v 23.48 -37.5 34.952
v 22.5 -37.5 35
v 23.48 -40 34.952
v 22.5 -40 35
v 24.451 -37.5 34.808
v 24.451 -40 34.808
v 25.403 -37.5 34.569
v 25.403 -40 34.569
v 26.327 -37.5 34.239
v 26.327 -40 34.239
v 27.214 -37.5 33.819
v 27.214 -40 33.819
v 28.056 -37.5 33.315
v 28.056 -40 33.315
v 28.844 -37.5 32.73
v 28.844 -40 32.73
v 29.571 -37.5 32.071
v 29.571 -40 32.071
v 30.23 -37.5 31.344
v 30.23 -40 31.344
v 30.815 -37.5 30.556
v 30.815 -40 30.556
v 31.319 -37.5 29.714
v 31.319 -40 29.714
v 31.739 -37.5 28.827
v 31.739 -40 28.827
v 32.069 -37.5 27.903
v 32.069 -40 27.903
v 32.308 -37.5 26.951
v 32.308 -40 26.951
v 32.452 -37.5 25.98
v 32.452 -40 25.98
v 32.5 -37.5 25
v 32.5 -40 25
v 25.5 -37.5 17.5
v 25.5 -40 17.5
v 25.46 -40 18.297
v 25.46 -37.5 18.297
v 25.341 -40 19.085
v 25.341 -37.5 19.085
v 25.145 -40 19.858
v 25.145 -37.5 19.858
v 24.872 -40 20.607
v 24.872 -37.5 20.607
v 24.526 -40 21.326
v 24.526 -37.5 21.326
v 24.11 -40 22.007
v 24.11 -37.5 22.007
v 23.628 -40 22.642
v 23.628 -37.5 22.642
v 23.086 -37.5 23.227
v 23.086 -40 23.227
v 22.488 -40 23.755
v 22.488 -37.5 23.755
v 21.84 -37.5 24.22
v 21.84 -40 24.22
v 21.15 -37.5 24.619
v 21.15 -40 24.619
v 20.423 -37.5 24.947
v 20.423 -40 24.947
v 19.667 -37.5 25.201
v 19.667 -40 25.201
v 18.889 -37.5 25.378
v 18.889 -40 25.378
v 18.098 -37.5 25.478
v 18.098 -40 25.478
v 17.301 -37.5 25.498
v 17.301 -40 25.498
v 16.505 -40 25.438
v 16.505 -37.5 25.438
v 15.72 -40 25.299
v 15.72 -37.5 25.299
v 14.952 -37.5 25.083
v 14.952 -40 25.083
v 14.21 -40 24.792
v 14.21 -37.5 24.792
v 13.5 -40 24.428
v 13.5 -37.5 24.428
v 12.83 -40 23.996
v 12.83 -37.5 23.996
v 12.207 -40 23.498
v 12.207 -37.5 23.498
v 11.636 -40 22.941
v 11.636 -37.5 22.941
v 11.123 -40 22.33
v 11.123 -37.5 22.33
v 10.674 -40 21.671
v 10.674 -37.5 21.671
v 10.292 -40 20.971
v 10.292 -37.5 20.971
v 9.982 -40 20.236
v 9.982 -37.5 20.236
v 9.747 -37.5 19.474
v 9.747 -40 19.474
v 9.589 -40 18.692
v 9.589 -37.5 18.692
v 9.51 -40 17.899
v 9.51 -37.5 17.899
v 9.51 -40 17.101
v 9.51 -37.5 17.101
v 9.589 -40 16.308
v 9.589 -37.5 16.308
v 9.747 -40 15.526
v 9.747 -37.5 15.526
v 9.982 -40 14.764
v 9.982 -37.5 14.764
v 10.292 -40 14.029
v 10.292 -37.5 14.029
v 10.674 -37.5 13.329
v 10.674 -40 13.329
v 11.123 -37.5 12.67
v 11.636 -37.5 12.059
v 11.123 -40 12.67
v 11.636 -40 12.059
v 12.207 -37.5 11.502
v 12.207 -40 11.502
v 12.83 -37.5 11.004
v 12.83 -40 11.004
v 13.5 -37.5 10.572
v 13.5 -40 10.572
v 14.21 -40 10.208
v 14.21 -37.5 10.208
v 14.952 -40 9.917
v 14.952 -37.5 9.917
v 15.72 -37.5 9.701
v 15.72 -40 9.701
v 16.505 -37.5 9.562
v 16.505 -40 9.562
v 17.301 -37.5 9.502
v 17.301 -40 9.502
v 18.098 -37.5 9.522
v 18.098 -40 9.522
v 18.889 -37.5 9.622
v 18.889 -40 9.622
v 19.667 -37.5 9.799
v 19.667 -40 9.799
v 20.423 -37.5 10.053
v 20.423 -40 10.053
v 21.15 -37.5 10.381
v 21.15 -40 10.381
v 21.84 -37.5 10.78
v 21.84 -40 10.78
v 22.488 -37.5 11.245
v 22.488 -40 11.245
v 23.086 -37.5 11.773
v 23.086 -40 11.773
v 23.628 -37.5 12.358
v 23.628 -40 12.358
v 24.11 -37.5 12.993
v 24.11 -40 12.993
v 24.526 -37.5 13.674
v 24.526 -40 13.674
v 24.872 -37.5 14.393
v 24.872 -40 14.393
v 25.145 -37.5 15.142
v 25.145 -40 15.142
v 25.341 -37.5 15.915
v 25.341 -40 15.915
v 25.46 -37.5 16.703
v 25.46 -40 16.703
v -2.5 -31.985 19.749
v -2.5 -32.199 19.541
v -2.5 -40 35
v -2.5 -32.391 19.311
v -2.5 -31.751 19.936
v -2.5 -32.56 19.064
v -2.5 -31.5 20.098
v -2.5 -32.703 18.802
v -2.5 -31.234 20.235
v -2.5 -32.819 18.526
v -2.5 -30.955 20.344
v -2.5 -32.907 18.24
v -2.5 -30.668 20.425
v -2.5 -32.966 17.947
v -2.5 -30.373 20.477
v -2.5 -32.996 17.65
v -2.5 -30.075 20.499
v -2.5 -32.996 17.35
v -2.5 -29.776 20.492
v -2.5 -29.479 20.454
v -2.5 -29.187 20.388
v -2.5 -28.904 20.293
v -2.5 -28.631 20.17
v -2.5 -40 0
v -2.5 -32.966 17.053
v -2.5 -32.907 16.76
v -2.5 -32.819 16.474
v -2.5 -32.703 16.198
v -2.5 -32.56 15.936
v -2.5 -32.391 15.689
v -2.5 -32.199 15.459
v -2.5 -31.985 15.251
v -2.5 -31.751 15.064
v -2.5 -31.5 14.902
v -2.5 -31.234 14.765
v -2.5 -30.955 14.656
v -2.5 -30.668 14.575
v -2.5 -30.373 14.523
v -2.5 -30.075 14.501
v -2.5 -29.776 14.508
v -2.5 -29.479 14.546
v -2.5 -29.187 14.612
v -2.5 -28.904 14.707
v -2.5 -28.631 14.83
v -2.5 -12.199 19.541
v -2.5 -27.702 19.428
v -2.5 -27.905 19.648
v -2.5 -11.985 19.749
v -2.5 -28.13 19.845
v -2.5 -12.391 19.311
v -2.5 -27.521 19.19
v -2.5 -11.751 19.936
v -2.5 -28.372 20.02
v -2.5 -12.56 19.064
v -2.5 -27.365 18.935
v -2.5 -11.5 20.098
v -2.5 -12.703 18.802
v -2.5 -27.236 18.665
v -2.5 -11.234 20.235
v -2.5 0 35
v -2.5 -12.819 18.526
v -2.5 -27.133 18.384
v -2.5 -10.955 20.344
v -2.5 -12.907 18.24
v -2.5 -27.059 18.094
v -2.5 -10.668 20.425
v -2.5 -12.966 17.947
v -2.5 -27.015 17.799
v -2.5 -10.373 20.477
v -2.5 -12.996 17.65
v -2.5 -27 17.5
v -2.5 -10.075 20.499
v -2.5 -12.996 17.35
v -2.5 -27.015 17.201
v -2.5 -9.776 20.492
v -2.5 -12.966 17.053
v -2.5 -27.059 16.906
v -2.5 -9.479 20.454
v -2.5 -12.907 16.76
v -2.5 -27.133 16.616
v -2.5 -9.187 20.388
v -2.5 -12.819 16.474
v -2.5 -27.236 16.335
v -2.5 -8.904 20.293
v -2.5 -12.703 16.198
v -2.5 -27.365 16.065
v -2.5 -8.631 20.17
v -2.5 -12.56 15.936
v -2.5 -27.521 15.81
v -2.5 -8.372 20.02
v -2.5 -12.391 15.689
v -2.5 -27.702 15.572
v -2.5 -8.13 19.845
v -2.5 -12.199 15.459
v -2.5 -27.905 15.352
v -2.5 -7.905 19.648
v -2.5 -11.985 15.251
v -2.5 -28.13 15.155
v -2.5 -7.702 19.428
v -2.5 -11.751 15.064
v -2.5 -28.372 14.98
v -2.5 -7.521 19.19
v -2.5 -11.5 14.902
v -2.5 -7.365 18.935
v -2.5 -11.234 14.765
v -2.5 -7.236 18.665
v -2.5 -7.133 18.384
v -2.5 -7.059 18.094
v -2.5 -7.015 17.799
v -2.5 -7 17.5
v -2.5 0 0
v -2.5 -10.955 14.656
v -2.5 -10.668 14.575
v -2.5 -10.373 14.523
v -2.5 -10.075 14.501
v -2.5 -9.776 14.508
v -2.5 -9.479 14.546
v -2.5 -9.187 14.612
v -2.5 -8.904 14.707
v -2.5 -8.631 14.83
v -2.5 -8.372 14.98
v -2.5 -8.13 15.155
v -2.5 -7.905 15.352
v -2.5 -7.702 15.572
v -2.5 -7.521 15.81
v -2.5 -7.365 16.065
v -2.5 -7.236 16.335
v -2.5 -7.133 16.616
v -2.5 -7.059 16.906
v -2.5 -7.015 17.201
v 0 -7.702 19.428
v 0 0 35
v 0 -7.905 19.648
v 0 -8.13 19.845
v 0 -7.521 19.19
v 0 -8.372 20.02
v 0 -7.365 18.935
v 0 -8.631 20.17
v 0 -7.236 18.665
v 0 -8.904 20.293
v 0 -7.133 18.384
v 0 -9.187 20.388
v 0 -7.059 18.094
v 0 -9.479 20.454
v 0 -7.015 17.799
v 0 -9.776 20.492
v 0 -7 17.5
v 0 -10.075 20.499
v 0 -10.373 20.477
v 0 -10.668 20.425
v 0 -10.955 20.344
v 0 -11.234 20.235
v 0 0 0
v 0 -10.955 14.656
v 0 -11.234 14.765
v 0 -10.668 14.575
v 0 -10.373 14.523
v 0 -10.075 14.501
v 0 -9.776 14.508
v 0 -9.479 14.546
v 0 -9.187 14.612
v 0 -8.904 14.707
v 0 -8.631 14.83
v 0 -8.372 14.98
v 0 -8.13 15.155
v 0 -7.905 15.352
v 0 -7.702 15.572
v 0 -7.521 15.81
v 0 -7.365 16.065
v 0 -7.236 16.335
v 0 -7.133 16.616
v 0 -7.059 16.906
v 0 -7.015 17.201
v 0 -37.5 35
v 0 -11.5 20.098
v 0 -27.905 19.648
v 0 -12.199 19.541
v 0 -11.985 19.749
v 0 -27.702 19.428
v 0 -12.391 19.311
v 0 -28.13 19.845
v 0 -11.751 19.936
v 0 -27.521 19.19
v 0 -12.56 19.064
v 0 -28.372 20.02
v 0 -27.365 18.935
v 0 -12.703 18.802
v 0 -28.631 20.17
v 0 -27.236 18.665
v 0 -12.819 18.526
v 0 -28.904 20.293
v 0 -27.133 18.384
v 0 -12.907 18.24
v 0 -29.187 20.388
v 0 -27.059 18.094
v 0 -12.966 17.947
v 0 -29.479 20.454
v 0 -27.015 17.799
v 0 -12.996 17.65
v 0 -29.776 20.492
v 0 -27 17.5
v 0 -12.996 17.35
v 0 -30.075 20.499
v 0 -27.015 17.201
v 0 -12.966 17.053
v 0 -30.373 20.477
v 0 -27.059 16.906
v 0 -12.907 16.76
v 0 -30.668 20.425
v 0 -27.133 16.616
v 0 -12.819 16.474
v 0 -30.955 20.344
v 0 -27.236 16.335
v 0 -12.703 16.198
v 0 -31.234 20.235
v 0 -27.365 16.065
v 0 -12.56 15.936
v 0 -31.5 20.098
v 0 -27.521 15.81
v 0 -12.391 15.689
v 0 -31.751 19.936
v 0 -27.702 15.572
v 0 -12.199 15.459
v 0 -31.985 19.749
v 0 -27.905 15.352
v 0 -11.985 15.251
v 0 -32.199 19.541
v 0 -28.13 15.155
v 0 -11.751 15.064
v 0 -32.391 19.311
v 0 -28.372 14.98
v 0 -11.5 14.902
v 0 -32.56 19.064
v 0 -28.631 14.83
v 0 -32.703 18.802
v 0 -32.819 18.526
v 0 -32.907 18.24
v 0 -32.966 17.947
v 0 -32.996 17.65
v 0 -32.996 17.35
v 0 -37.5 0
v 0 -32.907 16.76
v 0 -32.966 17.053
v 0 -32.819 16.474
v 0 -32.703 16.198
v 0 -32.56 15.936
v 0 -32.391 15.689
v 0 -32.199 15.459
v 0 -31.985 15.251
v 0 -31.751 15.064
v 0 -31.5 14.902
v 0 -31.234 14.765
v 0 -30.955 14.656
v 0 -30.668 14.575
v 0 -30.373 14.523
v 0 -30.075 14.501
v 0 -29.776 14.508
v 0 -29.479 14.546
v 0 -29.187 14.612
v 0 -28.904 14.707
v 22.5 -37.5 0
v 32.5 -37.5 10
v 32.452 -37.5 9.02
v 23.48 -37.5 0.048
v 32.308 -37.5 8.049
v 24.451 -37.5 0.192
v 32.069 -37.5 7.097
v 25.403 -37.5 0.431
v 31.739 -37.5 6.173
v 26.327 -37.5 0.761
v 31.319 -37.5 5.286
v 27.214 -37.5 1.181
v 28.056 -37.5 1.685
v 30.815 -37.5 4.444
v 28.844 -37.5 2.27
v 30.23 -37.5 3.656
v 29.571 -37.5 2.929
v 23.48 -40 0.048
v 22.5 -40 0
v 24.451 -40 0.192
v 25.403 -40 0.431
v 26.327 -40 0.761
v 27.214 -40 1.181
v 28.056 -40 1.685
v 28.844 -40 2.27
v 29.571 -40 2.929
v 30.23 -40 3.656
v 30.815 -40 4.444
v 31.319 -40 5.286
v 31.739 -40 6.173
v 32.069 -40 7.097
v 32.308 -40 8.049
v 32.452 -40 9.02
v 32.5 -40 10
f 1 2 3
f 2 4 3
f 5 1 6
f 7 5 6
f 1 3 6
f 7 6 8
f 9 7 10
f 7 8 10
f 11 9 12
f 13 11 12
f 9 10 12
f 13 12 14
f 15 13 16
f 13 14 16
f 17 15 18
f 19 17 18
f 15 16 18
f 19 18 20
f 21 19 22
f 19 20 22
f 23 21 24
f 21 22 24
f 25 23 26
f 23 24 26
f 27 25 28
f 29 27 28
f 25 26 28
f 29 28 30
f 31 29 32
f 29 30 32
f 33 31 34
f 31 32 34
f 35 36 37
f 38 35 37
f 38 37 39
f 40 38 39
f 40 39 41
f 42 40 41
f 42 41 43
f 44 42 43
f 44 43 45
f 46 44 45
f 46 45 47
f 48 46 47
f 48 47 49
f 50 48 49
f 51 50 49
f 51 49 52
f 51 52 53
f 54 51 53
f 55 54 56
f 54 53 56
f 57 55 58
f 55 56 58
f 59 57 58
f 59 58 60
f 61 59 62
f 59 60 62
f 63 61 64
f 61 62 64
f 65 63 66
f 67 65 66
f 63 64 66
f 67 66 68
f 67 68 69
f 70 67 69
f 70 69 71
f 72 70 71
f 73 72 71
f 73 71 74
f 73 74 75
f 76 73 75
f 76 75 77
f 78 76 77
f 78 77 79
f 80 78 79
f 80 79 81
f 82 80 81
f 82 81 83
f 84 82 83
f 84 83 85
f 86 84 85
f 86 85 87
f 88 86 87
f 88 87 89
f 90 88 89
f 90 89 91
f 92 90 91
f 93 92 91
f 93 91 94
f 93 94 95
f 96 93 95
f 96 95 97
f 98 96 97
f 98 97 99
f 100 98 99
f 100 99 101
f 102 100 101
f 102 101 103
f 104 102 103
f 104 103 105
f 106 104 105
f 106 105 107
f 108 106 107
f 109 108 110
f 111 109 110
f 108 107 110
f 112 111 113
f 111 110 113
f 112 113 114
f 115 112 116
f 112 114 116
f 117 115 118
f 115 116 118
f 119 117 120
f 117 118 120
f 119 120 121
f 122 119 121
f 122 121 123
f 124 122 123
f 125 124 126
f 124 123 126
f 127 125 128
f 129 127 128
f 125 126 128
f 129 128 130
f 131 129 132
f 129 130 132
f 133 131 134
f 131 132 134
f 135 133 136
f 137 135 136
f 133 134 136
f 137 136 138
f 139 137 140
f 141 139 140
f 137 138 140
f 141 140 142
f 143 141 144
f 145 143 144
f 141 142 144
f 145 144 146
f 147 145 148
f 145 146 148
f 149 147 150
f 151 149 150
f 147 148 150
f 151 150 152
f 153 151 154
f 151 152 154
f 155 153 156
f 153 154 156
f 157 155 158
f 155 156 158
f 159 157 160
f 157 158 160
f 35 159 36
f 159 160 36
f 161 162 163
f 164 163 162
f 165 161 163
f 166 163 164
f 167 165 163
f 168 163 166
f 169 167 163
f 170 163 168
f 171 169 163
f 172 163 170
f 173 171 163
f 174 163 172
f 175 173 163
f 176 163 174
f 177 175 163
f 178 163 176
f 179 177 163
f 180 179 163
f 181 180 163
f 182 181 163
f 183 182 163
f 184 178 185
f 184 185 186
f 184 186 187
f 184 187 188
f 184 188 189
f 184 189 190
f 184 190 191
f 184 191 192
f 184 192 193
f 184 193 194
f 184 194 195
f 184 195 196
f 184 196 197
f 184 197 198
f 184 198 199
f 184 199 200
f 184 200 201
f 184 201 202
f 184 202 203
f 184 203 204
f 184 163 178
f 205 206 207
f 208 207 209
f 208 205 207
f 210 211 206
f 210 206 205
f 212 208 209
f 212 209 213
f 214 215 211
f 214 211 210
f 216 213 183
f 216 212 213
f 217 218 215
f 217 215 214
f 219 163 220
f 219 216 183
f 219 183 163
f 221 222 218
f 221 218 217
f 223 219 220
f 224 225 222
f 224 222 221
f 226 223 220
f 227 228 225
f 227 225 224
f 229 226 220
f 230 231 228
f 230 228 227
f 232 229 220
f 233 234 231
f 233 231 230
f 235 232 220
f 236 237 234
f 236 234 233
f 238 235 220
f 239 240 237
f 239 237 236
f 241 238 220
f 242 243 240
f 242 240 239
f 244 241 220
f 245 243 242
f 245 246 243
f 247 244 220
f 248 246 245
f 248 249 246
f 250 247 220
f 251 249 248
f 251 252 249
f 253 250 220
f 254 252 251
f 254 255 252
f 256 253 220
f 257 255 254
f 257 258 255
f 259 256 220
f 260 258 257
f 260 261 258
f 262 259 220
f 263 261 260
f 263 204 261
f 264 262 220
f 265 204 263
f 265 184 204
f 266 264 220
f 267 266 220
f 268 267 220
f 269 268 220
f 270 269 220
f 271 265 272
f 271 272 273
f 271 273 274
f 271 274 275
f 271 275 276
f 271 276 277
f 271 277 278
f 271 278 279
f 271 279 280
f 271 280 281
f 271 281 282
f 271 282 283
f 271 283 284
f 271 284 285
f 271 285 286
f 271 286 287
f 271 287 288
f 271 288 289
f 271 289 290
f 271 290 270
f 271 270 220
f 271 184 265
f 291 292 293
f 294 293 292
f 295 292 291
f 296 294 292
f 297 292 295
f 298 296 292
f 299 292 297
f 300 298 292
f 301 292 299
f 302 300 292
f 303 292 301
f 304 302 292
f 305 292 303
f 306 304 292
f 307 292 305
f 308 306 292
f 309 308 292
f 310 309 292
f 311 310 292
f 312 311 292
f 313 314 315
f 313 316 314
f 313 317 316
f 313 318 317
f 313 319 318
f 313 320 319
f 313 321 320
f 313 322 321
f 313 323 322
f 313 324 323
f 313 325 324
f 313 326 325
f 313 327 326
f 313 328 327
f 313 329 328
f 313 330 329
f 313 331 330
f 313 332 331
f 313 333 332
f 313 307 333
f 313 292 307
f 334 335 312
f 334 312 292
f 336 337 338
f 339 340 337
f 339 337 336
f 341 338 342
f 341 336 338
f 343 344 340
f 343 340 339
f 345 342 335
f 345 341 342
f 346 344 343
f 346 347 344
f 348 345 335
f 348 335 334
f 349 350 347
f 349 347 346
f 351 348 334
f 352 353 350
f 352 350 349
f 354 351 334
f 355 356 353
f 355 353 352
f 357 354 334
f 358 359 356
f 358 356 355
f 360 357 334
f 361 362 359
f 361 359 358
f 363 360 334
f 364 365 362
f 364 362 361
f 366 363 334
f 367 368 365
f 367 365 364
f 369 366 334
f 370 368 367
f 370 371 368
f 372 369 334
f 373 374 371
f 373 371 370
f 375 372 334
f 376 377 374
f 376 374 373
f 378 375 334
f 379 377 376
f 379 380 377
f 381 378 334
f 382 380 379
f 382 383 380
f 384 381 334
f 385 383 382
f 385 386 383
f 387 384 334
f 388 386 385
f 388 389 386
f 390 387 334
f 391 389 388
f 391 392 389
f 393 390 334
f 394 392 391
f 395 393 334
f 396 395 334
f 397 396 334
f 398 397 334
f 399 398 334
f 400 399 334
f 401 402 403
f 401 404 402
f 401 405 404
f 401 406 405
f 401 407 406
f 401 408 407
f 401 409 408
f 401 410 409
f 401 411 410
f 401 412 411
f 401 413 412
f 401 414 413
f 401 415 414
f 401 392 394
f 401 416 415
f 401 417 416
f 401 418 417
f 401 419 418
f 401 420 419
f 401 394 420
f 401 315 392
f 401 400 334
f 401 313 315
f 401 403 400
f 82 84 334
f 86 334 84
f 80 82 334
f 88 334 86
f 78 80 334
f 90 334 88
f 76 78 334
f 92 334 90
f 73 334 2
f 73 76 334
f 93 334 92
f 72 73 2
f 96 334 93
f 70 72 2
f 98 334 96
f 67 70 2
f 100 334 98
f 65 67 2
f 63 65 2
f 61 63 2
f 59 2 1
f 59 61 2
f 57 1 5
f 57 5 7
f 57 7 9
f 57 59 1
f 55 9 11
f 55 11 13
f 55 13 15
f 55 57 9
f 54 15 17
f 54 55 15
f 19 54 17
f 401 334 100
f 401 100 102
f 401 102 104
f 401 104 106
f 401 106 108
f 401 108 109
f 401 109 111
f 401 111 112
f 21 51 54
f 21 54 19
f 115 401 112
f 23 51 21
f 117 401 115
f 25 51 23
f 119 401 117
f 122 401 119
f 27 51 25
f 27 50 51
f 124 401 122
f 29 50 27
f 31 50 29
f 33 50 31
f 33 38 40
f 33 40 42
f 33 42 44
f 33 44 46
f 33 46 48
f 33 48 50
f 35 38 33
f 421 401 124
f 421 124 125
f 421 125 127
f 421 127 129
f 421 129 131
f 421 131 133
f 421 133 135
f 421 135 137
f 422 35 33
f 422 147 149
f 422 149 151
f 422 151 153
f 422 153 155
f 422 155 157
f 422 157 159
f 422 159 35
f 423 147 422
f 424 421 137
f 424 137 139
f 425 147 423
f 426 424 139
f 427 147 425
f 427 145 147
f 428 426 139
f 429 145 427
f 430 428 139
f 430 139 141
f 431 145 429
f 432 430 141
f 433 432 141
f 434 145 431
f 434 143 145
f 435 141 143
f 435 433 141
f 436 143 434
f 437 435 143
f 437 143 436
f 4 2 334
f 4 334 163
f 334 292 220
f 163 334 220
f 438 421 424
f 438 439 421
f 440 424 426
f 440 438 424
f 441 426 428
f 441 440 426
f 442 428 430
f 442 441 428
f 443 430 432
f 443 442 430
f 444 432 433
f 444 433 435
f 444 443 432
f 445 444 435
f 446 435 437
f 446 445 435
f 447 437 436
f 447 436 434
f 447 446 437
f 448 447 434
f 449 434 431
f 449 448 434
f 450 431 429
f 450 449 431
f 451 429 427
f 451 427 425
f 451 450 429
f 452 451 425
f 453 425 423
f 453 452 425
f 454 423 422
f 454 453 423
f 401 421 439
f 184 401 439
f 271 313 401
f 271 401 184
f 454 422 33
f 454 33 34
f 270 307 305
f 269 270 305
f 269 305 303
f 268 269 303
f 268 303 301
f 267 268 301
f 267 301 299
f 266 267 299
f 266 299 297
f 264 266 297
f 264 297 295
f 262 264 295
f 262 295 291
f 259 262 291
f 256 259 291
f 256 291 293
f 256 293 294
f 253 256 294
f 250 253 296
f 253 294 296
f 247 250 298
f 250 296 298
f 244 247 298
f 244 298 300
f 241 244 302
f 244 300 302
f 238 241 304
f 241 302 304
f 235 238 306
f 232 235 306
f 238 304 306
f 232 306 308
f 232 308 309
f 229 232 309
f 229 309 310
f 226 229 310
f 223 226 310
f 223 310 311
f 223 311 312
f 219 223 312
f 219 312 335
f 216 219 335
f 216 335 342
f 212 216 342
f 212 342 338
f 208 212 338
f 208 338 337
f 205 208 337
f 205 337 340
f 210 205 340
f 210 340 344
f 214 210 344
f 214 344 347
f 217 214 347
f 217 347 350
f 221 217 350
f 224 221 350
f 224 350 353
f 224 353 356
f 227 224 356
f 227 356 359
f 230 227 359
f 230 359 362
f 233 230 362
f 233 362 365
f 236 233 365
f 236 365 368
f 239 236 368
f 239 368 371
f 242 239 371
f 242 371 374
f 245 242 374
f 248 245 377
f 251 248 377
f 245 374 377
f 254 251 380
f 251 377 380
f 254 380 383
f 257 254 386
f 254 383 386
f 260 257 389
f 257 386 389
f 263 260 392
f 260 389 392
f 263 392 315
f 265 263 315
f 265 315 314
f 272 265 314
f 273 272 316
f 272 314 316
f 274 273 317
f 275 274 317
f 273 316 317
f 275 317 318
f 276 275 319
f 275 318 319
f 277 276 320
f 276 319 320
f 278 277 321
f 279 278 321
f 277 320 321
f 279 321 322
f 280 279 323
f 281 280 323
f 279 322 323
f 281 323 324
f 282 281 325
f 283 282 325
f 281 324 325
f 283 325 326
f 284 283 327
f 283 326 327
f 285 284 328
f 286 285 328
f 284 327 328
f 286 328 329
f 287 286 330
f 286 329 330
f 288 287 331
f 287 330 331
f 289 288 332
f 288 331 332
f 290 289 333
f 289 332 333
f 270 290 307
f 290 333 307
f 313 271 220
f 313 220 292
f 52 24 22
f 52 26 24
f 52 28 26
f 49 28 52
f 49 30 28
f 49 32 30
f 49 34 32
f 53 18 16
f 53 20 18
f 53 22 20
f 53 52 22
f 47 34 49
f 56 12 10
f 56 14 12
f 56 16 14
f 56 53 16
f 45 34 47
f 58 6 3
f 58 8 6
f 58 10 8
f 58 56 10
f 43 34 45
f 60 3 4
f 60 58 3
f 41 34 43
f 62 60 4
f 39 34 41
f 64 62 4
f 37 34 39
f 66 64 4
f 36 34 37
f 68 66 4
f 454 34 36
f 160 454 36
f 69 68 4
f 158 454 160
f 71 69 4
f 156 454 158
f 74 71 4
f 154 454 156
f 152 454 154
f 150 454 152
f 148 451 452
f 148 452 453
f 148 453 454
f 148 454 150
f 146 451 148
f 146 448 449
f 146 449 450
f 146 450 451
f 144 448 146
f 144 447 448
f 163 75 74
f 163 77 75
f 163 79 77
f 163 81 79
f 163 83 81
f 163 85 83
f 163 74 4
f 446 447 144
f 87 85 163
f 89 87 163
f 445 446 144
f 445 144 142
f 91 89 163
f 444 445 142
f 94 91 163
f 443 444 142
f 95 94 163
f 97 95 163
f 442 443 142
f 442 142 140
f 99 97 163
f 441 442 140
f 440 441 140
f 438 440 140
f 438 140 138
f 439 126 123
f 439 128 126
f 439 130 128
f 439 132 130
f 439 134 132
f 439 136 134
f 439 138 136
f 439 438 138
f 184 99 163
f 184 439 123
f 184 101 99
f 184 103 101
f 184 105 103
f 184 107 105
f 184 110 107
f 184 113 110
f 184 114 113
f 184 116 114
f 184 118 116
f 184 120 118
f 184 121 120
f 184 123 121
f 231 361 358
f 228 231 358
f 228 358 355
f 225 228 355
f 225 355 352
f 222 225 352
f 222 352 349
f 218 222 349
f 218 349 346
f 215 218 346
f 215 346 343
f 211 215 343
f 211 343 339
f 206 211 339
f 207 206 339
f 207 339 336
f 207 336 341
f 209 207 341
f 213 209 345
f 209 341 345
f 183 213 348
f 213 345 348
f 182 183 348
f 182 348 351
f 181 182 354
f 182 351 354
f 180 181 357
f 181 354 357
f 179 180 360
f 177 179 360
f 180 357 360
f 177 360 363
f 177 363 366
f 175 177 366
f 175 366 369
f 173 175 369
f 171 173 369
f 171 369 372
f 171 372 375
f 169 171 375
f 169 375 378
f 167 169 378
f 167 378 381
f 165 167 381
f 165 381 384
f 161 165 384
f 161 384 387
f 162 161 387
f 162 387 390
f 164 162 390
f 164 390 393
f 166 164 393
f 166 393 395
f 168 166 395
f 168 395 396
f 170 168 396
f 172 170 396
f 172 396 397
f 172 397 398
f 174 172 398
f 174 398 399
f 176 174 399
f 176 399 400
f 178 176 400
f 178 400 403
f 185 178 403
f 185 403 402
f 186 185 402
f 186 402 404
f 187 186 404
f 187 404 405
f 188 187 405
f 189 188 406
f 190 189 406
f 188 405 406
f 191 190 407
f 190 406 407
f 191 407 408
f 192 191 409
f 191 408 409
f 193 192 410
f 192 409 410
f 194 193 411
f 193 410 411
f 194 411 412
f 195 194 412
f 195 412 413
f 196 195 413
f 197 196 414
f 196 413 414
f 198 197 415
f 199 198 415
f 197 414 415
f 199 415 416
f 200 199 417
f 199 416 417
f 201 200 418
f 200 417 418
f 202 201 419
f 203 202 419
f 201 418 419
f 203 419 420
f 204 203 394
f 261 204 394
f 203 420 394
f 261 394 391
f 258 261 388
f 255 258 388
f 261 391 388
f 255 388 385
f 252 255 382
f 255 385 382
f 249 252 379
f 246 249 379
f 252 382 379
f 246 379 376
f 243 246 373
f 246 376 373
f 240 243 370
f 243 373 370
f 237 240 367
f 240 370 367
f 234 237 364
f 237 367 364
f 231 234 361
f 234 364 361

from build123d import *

# Parameters (mm, degrees)
BOSS_EXTRU_1_DEPTH      = 35
ESQUISSE2_R             = 8
ENL_V_MAT_EXTRU_1_DEPTH = 20
ESQUISSE3_R             = 3
ENL_V_MAT_EXTRU_2_DEPTH = 20
CONG_1_R                = 10


with BuildPart() as part:
    # Esquisse1 → Boss.-Extru.1 (new body)
    with BuildSketch(Plane.XY):
        Polygon((0, 0), (0, -37.5), (32.5, -37.5), (32.5, -40), (-2.5, -40), (-2.5, 0), align=None)
    extrude(amount=BOSS_EXTRU_1_DEPTH)

    # Esquisse2 → Enlèv. mat.-Extru.1 (cut)
    with BuildSketch(Plane(origin=(0, -40, 0), x_dir=(-1, 0, 0), z_dir=(0, -1, 0))):
        with Locations(Location((-17.5, -17.5, 0), (0, 0, 180))):
            Circle(ESQUISSE2_R)
    extrude(amount=-ENL_V_MAT_EXTRU_1_DEPTH, mode=Mode.SUBTRACT)

    # Esquisse3 → Enlèv. mat.-Extru.2 (cut)
    with BuildSketch(Plane(origin=(0, 0, 0), x_dir=(0, 0, -1), z_dir=(1, 0, 0))):
        with Locations(Location((-17.5, -10, 0), (0, 0, 90))):
            Circle(ESQUISSE3_R)
        with Locations(Location((-17.5, -30, 0), (0, 0, 90))):
            Circle(ESQUISSE3_R)
    extrude(amount=-ENL_V_MAT_EXTRU_2_DEPTH, mode=Mode.SUBTRACT)

    # Congé1
    cong_1_edges = [part.edges().sort_by_distance(p)[0] for p in [
        (32.5, -38.75, 35),
        (32.5, -38.75, 0),
    ]]
    fillet(cong_1_edges, radius=CONG_1_R)


solid = part.part
